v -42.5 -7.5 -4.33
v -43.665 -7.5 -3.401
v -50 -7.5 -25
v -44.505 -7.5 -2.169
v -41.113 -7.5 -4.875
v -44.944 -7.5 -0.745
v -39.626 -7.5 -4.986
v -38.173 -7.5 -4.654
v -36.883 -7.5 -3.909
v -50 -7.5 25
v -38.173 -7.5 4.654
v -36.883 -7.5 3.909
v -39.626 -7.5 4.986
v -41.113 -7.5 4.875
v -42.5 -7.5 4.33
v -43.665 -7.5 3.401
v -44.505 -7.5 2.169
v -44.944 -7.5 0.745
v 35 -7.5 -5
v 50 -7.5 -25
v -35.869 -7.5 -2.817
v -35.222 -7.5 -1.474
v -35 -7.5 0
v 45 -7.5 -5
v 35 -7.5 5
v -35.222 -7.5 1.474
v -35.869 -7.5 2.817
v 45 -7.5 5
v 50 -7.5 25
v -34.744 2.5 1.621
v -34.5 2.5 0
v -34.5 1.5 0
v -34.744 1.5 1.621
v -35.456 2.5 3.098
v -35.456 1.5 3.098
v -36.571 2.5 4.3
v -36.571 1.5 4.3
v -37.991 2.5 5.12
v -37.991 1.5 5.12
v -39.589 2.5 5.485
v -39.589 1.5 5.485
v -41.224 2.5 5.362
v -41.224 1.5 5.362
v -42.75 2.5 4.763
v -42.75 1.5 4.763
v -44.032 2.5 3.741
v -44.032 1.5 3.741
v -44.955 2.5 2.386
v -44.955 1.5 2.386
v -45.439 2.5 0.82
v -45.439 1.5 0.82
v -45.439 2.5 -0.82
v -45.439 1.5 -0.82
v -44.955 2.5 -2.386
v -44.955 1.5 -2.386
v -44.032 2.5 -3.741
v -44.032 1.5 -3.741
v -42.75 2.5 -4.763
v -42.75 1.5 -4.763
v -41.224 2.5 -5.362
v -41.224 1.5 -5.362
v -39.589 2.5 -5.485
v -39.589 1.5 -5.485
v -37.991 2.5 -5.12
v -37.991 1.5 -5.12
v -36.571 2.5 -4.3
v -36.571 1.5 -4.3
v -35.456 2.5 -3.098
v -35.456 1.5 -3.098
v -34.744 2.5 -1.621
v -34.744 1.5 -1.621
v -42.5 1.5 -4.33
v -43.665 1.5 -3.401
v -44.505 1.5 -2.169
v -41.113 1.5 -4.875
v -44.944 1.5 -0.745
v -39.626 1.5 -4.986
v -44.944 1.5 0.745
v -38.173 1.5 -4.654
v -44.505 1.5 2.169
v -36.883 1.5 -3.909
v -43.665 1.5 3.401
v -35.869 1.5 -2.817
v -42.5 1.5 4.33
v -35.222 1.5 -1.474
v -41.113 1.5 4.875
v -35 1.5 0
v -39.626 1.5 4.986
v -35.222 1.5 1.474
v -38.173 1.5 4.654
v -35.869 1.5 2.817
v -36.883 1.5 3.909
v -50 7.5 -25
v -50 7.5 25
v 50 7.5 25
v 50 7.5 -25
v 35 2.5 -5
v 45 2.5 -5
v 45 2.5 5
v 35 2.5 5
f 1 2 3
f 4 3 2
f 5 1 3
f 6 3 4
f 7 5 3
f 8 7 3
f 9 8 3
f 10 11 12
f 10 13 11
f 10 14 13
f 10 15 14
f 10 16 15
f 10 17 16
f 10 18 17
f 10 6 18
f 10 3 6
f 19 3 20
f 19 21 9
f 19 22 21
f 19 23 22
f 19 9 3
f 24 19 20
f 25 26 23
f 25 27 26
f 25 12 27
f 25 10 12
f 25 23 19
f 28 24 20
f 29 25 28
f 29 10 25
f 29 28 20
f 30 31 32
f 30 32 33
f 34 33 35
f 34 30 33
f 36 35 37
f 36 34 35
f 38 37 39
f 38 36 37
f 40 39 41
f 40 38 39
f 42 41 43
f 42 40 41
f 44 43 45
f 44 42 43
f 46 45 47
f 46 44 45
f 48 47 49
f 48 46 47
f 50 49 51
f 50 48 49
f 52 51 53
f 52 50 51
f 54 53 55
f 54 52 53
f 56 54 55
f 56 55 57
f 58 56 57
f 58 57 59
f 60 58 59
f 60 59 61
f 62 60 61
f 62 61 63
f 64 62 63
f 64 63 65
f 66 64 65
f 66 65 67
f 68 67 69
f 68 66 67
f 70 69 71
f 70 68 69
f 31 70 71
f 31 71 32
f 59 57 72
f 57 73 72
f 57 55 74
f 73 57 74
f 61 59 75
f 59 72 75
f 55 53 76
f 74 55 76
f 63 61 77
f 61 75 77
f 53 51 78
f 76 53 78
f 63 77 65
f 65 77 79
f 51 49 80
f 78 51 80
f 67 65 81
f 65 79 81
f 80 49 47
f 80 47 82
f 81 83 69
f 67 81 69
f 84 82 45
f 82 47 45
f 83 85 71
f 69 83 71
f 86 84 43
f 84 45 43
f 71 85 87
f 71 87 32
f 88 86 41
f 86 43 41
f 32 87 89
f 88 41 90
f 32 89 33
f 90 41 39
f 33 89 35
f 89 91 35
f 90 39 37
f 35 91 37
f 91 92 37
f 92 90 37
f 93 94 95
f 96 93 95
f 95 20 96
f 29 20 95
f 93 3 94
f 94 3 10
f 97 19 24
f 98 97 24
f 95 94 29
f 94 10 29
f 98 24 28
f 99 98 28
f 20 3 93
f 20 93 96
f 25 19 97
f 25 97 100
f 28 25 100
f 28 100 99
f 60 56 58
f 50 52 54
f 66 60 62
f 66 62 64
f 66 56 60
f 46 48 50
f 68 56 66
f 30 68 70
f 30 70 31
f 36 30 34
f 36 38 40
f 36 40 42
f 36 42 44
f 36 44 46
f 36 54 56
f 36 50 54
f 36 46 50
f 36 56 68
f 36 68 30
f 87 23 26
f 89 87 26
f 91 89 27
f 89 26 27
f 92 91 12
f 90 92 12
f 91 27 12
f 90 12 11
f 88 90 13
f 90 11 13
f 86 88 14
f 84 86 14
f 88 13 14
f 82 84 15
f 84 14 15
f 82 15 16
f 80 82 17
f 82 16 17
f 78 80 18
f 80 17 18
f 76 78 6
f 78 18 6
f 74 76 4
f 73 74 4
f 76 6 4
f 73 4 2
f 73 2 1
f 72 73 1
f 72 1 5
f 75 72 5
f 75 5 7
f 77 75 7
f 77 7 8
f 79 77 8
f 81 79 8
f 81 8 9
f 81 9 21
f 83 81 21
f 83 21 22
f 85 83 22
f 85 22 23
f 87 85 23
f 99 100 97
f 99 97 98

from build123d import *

# Parameters (mm, degrees)
F0_W     = 100
F0_H     = 50
F1_DEPTH = 7.5
F2_R     = 5
F2_W     = 10
F2_H     = 10
F3_DEPTH = 10
F4_R     = 5.5
F5_DEPTH = 1


# Not quite as in the source:
# - a feature names something its author has since deleted; it is built from what else it names


with BuildPart() as f1:
    # F0 (on Front) → F1 (new body, symmetric)
    with BuildSketch(Plane.XZ):
        Rectangle(F0_W, F0_H)
    extrude(amount=F1_DEPTH, both=True)

    # F2 (on face) → F3 (cut)
    with BuildSketch(Plane.XZ.offset(7.5)):
        with Locations((-40, 0)):
            Circle(F2_R)
        with Locations((40, 0)):
            Rectangle(F2_W, F2_H)
    extrude(amount=-F3_DEPTH, mode=Mode.SUBTRACT)

    # F4 (on face) → F5 (cut)
    with BuildSketch(Plane.XZ.offset(-2.5)):
        with Locations((-40, 0)):
            Circle(F4_R)
    extrude(amount=F5_DEPTH, mode=Mode.SUBTRACT)


solid = f1.part
